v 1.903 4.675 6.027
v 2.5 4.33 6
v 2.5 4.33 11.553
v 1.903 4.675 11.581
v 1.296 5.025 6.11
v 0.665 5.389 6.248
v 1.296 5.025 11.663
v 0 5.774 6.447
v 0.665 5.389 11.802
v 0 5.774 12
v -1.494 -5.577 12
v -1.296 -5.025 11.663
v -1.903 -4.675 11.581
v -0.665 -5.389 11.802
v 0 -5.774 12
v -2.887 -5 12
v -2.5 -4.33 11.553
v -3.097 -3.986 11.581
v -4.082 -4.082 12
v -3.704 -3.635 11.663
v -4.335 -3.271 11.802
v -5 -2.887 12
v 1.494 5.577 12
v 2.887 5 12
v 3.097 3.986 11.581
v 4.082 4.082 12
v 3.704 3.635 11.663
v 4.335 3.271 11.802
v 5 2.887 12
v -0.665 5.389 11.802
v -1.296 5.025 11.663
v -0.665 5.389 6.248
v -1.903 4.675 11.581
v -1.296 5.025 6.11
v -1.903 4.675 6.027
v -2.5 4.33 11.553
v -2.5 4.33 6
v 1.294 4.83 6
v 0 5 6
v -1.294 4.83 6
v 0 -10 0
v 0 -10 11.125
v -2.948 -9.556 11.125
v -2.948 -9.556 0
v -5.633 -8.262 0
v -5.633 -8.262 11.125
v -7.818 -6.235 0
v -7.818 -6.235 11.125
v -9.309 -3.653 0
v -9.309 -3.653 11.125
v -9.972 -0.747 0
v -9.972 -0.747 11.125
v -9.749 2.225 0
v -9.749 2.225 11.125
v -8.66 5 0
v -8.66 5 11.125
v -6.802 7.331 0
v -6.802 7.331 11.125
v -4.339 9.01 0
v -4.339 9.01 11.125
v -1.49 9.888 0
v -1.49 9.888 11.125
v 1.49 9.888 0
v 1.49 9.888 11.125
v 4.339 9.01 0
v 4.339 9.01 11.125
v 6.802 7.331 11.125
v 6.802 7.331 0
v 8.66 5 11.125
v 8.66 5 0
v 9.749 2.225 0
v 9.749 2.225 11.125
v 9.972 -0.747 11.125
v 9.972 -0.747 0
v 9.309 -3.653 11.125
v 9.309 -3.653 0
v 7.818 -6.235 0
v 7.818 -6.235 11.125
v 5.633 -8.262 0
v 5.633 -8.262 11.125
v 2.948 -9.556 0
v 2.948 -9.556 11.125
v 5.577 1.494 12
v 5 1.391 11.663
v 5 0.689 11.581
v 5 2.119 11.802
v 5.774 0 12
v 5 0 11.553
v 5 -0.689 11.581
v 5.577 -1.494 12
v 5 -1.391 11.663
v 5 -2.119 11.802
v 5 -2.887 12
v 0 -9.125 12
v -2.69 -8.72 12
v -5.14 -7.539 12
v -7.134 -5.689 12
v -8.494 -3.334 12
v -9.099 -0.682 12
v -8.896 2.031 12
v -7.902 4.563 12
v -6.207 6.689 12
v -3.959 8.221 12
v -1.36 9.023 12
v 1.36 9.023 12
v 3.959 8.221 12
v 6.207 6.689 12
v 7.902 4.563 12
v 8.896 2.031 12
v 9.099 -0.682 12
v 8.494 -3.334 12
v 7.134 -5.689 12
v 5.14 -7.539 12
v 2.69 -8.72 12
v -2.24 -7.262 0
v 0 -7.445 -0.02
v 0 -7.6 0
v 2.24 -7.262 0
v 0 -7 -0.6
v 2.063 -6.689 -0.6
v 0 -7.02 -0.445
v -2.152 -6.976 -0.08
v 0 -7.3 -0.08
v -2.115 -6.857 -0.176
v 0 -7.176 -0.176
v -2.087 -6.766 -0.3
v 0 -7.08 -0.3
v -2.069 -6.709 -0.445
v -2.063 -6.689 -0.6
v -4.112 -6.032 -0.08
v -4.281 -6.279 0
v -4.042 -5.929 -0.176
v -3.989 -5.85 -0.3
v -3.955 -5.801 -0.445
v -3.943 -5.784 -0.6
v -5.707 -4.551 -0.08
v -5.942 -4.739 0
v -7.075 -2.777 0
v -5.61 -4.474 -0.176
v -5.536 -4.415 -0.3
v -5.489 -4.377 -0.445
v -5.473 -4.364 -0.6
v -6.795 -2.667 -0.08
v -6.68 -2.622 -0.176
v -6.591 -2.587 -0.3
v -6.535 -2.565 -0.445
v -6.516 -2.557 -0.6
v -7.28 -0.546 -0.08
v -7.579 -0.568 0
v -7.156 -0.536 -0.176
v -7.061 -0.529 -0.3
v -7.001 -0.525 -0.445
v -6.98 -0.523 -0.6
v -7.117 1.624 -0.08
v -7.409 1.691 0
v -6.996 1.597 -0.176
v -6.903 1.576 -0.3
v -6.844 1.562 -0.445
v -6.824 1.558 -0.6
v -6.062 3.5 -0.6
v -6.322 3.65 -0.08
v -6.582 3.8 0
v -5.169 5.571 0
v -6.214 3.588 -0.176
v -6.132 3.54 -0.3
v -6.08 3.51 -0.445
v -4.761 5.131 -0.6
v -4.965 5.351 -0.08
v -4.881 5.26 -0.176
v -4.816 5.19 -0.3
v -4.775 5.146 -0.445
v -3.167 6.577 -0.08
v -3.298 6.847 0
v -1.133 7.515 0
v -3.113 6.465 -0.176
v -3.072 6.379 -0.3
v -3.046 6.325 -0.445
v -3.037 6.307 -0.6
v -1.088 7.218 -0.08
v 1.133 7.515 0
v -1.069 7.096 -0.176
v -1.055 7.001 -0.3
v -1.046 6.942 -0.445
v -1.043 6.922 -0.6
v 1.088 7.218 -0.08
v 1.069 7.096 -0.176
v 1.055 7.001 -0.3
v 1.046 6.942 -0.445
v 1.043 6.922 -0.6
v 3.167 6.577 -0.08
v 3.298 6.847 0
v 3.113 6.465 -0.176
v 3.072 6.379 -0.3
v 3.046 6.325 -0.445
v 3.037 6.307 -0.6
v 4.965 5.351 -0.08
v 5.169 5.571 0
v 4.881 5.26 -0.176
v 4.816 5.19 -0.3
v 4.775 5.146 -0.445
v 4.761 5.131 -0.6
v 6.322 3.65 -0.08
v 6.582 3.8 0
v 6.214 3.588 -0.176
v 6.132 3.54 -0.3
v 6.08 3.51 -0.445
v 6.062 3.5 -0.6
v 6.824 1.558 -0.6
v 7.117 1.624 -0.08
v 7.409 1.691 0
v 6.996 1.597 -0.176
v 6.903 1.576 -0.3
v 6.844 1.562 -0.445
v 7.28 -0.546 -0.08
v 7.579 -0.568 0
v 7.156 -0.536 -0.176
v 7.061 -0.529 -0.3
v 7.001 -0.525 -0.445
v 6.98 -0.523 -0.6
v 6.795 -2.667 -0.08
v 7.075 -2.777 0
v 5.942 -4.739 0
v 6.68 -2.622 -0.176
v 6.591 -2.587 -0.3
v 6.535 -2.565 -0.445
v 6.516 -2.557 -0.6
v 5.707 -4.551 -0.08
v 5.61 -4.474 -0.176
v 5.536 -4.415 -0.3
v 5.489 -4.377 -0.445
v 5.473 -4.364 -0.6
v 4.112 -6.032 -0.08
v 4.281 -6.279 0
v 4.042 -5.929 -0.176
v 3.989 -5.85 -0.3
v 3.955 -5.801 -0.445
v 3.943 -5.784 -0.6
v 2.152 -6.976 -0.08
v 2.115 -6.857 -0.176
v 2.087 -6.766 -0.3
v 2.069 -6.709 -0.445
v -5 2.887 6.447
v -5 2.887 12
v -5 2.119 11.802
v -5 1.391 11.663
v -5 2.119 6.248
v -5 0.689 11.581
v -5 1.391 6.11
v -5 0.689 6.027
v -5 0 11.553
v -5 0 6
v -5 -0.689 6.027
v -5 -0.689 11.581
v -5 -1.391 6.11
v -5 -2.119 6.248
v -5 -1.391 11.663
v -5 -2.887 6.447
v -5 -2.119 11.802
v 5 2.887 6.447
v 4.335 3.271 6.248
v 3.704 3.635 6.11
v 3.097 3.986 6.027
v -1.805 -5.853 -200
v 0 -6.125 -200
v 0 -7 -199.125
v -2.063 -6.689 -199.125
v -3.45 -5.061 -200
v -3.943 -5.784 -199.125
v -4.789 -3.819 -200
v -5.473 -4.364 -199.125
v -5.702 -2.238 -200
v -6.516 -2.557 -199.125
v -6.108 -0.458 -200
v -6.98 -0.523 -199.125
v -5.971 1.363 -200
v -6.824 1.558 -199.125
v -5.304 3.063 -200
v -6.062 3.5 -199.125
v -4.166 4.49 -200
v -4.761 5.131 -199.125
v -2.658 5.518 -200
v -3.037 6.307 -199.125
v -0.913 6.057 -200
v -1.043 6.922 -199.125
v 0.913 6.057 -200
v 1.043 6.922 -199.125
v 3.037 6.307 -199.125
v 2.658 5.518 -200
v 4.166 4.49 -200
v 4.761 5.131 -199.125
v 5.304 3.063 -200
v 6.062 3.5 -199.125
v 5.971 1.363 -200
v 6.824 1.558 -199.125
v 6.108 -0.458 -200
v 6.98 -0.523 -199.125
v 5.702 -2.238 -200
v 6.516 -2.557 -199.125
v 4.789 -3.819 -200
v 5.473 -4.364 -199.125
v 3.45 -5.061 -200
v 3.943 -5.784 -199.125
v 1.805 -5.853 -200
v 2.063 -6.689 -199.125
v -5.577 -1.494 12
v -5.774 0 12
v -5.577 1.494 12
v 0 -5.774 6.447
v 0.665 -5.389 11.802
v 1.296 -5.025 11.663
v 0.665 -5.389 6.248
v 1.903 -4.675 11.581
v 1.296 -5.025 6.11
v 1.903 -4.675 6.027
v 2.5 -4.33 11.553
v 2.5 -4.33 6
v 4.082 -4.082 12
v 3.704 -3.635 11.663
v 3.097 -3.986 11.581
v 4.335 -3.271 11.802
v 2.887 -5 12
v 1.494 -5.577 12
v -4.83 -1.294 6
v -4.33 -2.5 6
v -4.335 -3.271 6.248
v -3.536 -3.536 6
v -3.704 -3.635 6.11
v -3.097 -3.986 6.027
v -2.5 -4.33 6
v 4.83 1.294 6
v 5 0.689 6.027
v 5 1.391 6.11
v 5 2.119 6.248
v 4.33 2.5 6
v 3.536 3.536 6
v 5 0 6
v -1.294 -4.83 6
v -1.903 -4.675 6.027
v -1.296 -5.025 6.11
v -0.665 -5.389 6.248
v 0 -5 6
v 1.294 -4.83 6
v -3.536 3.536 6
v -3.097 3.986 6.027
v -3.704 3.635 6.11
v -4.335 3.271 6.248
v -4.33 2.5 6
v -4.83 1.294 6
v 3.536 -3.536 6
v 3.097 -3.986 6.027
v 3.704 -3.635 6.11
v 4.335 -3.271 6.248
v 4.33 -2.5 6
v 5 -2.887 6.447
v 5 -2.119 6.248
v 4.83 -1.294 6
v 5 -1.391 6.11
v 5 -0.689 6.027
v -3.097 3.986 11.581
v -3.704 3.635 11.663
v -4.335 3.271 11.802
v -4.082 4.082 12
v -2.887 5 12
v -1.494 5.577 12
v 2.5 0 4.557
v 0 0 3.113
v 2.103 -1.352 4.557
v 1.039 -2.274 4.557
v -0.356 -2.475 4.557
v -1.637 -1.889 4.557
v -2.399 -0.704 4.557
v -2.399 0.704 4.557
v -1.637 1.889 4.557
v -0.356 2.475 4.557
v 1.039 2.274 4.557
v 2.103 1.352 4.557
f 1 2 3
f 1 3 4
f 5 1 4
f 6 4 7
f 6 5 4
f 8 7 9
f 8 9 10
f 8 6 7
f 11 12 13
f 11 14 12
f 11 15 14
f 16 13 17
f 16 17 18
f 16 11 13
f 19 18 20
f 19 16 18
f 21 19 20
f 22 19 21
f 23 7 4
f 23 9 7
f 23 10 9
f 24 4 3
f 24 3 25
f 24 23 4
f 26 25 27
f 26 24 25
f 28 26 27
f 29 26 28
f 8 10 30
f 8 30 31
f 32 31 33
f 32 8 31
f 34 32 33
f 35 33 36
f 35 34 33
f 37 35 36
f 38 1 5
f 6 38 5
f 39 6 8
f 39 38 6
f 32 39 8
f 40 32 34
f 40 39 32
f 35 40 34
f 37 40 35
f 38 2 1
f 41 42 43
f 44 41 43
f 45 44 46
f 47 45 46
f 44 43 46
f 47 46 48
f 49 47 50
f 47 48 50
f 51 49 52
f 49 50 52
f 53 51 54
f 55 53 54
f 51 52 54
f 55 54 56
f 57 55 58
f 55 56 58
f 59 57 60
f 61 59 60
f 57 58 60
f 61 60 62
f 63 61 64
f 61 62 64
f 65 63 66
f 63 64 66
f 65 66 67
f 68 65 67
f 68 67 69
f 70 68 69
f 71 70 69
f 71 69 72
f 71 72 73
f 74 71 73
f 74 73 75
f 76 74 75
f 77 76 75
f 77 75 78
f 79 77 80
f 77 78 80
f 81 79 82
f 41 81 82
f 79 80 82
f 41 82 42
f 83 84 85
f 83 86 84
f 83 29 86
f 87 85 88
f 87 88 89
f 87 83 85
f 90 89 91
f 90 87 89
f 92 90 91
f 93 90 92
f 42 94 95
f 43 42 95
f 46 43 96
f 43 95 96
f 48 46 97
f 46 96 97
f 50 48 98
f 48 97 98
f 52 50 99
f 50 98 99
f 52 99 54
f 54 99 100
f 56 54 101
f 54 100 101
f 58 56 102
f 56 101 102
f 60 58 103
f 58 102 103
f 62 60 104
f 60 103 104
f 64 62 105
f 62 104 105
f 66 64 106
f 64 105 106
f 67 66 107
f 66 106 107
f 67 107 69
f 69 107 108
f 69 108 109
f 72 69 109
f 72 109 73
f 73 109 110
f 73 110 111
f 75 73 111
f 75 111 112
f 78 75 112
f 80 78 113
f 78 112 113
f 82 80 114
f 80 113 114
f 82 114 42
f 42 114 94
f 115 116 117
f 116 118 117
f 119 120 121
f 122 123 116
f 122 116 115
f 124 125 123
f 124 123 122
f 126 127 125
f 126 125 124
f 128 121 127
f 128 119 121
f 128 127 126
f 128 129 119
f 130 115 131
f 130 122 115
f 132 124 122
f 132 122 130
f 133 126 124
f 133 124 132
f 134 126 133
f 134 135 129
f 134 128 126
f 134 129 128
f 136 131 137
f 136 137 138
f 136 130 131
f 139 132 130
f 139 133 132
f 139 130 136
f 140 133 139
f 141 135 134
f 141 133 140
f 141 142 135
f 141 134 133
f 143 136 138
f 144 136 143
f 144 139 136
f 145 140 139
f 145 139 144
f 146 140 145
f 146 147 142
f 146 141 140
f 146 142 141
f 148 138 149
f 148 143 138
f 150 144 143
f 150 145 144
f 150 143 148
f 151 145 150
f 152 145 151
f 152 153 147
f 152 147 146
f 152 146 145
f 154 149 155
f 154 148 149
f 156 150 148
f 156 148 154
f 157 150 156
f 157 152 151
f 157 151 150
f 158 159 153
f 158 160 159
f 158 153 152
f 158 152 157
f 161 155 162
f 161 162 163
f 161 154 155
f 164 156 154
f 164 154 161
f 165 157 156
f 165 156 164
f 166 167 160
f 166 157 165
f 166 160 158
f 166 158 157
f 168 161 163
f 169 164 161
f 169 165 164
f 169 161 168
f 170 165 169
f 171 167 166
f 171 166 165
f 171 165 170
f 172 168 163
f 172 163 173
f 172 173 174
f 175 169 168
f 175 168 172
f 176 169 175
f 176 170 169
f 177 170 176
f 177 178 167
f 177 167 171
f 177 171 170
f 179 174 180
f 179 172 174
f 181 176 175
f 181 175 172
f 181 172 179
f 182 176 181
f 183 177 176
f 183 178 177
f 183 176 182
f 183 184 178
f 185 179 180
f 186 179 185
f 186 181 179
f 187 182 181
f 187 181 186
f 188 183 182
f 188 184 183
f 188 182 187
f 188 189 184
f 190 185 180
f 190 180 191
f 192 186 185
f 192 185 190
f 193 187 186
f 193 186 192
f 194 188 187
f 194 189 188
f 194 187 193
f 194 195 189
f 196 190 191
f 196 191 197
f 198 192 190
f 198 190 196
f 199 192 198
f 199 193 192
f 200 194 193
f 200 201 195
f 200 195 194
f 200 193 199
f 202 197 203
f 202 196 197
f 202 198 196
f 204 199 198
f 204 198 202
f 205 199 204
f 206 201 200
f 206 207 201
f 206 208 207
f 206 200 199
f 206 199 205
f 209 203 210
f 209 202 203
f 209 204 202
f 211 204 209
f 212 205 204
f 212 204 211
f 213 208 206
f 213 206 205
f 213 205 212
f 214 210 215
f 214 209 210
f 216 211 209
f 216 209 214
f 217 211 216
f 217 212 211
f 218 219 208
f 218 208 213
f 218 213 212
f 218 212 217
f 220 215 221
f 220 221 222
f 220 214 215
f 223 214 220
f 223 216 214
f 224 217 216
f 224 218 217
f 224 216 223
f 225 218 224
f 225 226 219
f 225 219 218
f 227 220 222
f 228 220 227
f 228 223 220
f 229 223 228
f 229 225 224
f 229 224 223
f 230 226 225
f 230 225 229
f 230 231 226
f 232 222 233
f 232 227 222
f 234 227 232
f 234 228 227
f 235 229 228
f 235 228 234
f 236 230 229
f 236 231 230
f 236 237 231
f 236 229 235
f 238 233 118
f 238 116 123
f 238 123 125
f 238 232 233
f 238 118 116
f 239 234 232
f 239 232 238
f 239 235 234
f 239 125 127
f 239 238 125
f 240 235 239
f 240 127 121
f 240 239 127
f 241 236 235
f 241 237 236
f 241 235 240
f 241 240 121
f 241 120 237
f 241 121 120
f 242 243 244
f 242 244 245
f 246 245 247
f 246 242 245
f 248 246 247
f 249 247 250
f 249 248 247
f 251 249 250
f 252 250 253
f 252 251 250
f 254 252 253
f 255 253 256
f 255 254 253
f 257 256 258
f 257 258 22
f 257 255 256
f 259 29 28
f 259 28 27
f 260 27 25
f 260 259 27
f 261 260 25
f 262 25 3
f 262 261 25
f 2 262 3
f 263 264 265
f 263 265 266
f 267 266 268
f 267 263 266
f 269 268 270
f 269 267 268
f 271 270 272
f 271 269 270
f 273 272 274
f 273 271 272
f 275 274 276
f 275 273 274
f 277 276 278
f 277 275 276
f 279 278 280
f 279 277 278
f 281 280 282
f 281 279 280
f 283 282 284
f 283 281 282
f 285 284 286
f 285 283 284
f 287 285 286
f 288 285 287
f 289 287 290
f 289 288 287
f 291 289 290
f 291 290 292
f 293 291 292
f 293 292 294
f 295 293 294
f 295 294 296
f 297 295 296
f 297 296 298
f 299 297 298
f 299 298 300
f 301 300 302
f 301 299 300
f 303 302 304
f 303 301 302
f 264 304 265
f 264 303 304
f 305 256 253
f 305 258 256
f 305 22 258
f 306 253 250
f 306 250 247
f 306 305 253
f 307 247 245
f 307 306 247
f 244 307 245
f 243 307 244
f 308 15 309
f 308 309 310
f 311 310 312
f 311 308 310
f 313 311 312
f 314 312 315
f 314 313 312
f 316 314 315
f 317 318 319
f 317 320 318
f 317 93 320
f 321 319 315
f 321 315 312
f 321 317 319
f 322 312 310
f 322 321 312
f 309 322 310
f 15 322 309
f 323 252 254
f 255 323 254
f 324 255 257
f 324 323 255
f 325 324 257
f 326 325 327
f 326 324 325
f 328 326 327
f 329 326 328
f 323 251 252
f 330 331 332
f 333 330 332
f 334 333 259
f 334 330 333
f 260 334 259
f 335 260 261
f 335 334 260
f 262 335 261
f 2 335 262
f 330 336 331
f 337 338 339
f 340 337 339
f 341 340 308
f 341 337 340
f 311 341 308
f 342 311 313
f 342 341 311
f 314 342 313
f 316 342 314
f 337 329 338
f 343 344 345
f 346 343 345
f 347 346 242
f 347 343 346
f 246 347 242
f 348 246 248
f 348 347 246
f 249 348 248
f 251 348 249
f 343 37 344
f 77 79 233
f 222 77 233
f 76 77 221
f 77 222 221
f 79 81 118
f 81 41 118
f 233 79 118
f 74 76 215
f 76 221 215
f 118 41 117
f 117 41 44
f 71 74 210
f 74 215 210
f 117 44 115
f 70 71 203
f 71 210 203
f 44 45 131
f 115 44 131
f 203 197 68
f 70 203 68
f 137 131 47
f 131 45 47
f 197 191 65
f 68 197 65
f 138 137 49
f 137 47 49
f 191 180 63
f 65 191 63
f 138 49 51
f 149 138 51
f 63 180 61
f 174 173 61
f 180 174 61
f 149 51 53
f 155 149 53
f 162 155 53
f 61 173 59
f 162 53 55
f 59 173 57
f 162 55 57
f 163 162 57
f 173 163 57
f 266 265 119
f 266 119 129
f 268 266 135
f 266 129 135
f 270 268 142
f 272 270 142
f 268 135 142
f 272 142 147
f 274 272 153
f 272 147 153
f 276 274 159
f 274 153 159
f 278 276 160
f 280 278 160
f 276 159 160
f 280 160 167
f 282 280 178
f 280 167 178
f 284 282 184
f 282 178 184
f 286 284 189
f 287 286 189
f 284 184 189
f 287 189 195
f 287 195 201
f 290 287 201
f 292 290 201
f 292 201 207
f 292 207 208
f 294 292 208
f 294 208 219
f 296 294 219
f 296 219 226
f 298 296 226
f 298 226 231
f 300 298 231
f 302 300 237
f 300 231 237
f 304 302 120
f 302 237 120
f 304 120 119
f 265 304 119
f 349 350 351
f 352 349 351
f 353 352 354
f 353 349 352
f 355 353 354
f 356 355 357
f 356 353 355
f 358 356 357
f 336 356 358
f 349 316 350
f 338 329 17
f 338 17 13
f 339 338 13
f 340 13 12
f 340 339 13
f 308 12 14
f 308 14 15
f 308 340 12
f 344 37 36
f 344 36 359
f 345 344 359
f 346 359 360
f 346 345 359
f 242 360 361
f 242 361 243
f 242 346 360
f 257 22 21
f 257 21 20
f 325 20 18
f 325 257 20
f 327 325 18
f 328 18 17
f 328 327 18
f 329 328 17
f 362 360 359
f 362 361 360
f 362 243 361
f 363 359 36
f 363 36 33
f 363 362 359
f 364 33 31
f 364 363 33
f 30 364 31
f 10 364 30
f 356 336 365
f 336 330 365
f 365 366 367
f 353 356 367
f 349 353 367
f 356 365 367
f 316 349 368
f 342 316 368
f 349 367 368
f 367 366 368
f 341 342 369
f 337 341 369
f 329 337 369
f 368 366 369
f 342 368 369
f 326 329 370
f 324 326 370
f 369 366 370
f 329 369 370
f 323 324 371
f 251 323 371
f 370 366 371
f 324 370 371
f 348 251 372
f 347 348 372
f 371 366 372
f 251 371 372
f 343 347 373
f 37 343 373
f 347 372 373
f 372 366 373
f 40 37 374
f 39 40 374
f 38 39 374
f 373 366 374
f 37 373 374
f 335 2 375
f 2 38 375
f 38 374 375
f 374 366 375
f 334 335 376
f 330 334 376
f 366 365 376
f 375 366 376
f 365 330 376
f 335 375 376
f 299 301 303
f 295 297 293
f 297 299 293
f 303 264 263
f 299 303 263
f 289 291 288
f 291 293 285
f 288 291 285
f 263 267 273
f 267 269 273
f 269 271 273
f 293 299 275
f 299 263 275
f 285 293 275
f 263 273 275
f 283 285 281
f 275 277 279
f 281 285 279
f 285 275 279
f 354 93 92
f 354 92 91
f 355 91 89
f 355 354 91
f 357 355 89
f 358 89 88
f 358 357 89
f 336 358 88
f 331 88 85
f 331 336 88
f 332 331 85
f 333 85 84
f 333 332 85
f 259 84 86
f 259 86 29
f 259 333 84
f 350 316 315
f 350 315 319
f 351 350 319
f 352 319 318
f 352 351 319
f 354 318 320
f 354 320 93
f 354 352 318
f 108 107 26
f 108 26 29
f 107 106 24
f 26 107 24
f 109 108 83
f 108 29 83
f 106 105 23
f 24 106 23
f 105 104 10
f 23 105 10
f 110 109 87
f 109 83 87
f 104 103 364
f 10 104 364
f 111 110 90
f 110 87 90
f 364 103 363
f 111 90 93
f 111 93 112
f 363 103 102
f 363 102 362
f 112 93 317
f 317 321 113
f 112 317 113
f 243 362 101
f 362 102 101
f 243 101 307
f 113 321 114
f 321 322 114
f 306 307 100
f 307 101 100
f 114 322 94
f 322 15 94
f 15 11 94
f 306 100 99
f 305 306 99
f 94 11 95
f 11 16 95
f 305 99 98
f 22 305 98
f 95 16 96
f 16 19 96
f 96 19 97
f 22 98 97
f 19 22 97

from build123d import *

# Parameters (mm, degrees)
CHAMFER1_SIZE      = 0.875
CUT_EXTRUDE1_REACH = 214.471
FILLET2_R          = 0.6


with BuildPart() as part:
    # Sketch1 → Revolve1 (revolve)
    with BuildSketch(Plane(origin=(0, 0, 0), x_dir=(0, 0, -1), z_dir=(1, 0, 0))):
        Polygon((0, 10), (-12, 10), (-12, 0), (200, 0), (200, 7), (0, 7), align=None)
    revolve(axis=Axis((0, 0, 12), (0, 0, -1)))

    # Sketch7 → Cut-Revolve2 (revolve, cut)
    with BuildSketch(Plane(origin=(0, 0, 0), x_dir=(0, 0, -1), z_dir=(1, 0, 0))):
        Polygon((-12, 0), (-12, 5), (-6, 5), (-3.113248654, 0), align=None)
    revolve(axis=Axis((0, 0, 12), (0, 0, -1)), mode=Mode.SUBTRACT)

    # Chamfer1
    chamfer1_edges = [part.edges().sort_by_distance(p)[0] for p in [
        (0, -7, -200),
        (0, -10, 12),
    ]]
    chamfer(chamfer1_edges, length=CHAMFER1_SIZE)

    # Cut-Extrude1: up to this cone (the profile starts inside it)
    cut_extrude1_end = Plane(origin=(0, 0, 12), z_dir=(0, 0, 1)).offset(-8.886750346) * Cone(1.732e-06, 414.393253037, 239.250055191, align=(Align.CENTER, Align.CENTER, Align.MIN), mode=Mode.PRIVATE)
    # Sketch8 → Cut-Extrude1 (cut, up to the surface)
    with BuildSketch(Plane.XY.offset(12), mode=Mode.PRIVATE) as cut_extrude1_sk1:
        Polygon((0, 5.773502692), (-5, 2.886751346), (-5, -2.886751346), (0, -5.773502692), (5, -2.886751346), (5, 2.886751346), align=None)
    cut_extrude1_tool1 = extrude(cut_extrude1_sk1.sketch, amount=-CUT_EXTRUDE1_REACH, mode=Mode.PRIVATE) & cut_extrude1_end
    add(cut_extrude1_tool1.solids().sort_by_distance((0, 0, 12))[0], mode=Mode.SUBTRACT)

    # Sketch9 → Cut-Revolve3 (revolve, cut)
    with BuildSketch(Plane(origin=(0, 0, 0), x_dir=(0, 0, -1), z_dir=(1, 0, 0))):
        Polygon((-12.5, 6.639528096), (-12.5, 5), (-11.553418013, 5), align=None)
    revolve(axis=Axis((0, 0, 12), (0, 0, -1)), mode=Mode.SUBTRACT)

    # Fillet2
    fillet2_edges = [part.edges().sort_by_distance(p)[0] for p in [
        (0, -7, 0),
    ]]
    fillet(fillet2_edges, radius=FILLET2_R)


solid = part.part
